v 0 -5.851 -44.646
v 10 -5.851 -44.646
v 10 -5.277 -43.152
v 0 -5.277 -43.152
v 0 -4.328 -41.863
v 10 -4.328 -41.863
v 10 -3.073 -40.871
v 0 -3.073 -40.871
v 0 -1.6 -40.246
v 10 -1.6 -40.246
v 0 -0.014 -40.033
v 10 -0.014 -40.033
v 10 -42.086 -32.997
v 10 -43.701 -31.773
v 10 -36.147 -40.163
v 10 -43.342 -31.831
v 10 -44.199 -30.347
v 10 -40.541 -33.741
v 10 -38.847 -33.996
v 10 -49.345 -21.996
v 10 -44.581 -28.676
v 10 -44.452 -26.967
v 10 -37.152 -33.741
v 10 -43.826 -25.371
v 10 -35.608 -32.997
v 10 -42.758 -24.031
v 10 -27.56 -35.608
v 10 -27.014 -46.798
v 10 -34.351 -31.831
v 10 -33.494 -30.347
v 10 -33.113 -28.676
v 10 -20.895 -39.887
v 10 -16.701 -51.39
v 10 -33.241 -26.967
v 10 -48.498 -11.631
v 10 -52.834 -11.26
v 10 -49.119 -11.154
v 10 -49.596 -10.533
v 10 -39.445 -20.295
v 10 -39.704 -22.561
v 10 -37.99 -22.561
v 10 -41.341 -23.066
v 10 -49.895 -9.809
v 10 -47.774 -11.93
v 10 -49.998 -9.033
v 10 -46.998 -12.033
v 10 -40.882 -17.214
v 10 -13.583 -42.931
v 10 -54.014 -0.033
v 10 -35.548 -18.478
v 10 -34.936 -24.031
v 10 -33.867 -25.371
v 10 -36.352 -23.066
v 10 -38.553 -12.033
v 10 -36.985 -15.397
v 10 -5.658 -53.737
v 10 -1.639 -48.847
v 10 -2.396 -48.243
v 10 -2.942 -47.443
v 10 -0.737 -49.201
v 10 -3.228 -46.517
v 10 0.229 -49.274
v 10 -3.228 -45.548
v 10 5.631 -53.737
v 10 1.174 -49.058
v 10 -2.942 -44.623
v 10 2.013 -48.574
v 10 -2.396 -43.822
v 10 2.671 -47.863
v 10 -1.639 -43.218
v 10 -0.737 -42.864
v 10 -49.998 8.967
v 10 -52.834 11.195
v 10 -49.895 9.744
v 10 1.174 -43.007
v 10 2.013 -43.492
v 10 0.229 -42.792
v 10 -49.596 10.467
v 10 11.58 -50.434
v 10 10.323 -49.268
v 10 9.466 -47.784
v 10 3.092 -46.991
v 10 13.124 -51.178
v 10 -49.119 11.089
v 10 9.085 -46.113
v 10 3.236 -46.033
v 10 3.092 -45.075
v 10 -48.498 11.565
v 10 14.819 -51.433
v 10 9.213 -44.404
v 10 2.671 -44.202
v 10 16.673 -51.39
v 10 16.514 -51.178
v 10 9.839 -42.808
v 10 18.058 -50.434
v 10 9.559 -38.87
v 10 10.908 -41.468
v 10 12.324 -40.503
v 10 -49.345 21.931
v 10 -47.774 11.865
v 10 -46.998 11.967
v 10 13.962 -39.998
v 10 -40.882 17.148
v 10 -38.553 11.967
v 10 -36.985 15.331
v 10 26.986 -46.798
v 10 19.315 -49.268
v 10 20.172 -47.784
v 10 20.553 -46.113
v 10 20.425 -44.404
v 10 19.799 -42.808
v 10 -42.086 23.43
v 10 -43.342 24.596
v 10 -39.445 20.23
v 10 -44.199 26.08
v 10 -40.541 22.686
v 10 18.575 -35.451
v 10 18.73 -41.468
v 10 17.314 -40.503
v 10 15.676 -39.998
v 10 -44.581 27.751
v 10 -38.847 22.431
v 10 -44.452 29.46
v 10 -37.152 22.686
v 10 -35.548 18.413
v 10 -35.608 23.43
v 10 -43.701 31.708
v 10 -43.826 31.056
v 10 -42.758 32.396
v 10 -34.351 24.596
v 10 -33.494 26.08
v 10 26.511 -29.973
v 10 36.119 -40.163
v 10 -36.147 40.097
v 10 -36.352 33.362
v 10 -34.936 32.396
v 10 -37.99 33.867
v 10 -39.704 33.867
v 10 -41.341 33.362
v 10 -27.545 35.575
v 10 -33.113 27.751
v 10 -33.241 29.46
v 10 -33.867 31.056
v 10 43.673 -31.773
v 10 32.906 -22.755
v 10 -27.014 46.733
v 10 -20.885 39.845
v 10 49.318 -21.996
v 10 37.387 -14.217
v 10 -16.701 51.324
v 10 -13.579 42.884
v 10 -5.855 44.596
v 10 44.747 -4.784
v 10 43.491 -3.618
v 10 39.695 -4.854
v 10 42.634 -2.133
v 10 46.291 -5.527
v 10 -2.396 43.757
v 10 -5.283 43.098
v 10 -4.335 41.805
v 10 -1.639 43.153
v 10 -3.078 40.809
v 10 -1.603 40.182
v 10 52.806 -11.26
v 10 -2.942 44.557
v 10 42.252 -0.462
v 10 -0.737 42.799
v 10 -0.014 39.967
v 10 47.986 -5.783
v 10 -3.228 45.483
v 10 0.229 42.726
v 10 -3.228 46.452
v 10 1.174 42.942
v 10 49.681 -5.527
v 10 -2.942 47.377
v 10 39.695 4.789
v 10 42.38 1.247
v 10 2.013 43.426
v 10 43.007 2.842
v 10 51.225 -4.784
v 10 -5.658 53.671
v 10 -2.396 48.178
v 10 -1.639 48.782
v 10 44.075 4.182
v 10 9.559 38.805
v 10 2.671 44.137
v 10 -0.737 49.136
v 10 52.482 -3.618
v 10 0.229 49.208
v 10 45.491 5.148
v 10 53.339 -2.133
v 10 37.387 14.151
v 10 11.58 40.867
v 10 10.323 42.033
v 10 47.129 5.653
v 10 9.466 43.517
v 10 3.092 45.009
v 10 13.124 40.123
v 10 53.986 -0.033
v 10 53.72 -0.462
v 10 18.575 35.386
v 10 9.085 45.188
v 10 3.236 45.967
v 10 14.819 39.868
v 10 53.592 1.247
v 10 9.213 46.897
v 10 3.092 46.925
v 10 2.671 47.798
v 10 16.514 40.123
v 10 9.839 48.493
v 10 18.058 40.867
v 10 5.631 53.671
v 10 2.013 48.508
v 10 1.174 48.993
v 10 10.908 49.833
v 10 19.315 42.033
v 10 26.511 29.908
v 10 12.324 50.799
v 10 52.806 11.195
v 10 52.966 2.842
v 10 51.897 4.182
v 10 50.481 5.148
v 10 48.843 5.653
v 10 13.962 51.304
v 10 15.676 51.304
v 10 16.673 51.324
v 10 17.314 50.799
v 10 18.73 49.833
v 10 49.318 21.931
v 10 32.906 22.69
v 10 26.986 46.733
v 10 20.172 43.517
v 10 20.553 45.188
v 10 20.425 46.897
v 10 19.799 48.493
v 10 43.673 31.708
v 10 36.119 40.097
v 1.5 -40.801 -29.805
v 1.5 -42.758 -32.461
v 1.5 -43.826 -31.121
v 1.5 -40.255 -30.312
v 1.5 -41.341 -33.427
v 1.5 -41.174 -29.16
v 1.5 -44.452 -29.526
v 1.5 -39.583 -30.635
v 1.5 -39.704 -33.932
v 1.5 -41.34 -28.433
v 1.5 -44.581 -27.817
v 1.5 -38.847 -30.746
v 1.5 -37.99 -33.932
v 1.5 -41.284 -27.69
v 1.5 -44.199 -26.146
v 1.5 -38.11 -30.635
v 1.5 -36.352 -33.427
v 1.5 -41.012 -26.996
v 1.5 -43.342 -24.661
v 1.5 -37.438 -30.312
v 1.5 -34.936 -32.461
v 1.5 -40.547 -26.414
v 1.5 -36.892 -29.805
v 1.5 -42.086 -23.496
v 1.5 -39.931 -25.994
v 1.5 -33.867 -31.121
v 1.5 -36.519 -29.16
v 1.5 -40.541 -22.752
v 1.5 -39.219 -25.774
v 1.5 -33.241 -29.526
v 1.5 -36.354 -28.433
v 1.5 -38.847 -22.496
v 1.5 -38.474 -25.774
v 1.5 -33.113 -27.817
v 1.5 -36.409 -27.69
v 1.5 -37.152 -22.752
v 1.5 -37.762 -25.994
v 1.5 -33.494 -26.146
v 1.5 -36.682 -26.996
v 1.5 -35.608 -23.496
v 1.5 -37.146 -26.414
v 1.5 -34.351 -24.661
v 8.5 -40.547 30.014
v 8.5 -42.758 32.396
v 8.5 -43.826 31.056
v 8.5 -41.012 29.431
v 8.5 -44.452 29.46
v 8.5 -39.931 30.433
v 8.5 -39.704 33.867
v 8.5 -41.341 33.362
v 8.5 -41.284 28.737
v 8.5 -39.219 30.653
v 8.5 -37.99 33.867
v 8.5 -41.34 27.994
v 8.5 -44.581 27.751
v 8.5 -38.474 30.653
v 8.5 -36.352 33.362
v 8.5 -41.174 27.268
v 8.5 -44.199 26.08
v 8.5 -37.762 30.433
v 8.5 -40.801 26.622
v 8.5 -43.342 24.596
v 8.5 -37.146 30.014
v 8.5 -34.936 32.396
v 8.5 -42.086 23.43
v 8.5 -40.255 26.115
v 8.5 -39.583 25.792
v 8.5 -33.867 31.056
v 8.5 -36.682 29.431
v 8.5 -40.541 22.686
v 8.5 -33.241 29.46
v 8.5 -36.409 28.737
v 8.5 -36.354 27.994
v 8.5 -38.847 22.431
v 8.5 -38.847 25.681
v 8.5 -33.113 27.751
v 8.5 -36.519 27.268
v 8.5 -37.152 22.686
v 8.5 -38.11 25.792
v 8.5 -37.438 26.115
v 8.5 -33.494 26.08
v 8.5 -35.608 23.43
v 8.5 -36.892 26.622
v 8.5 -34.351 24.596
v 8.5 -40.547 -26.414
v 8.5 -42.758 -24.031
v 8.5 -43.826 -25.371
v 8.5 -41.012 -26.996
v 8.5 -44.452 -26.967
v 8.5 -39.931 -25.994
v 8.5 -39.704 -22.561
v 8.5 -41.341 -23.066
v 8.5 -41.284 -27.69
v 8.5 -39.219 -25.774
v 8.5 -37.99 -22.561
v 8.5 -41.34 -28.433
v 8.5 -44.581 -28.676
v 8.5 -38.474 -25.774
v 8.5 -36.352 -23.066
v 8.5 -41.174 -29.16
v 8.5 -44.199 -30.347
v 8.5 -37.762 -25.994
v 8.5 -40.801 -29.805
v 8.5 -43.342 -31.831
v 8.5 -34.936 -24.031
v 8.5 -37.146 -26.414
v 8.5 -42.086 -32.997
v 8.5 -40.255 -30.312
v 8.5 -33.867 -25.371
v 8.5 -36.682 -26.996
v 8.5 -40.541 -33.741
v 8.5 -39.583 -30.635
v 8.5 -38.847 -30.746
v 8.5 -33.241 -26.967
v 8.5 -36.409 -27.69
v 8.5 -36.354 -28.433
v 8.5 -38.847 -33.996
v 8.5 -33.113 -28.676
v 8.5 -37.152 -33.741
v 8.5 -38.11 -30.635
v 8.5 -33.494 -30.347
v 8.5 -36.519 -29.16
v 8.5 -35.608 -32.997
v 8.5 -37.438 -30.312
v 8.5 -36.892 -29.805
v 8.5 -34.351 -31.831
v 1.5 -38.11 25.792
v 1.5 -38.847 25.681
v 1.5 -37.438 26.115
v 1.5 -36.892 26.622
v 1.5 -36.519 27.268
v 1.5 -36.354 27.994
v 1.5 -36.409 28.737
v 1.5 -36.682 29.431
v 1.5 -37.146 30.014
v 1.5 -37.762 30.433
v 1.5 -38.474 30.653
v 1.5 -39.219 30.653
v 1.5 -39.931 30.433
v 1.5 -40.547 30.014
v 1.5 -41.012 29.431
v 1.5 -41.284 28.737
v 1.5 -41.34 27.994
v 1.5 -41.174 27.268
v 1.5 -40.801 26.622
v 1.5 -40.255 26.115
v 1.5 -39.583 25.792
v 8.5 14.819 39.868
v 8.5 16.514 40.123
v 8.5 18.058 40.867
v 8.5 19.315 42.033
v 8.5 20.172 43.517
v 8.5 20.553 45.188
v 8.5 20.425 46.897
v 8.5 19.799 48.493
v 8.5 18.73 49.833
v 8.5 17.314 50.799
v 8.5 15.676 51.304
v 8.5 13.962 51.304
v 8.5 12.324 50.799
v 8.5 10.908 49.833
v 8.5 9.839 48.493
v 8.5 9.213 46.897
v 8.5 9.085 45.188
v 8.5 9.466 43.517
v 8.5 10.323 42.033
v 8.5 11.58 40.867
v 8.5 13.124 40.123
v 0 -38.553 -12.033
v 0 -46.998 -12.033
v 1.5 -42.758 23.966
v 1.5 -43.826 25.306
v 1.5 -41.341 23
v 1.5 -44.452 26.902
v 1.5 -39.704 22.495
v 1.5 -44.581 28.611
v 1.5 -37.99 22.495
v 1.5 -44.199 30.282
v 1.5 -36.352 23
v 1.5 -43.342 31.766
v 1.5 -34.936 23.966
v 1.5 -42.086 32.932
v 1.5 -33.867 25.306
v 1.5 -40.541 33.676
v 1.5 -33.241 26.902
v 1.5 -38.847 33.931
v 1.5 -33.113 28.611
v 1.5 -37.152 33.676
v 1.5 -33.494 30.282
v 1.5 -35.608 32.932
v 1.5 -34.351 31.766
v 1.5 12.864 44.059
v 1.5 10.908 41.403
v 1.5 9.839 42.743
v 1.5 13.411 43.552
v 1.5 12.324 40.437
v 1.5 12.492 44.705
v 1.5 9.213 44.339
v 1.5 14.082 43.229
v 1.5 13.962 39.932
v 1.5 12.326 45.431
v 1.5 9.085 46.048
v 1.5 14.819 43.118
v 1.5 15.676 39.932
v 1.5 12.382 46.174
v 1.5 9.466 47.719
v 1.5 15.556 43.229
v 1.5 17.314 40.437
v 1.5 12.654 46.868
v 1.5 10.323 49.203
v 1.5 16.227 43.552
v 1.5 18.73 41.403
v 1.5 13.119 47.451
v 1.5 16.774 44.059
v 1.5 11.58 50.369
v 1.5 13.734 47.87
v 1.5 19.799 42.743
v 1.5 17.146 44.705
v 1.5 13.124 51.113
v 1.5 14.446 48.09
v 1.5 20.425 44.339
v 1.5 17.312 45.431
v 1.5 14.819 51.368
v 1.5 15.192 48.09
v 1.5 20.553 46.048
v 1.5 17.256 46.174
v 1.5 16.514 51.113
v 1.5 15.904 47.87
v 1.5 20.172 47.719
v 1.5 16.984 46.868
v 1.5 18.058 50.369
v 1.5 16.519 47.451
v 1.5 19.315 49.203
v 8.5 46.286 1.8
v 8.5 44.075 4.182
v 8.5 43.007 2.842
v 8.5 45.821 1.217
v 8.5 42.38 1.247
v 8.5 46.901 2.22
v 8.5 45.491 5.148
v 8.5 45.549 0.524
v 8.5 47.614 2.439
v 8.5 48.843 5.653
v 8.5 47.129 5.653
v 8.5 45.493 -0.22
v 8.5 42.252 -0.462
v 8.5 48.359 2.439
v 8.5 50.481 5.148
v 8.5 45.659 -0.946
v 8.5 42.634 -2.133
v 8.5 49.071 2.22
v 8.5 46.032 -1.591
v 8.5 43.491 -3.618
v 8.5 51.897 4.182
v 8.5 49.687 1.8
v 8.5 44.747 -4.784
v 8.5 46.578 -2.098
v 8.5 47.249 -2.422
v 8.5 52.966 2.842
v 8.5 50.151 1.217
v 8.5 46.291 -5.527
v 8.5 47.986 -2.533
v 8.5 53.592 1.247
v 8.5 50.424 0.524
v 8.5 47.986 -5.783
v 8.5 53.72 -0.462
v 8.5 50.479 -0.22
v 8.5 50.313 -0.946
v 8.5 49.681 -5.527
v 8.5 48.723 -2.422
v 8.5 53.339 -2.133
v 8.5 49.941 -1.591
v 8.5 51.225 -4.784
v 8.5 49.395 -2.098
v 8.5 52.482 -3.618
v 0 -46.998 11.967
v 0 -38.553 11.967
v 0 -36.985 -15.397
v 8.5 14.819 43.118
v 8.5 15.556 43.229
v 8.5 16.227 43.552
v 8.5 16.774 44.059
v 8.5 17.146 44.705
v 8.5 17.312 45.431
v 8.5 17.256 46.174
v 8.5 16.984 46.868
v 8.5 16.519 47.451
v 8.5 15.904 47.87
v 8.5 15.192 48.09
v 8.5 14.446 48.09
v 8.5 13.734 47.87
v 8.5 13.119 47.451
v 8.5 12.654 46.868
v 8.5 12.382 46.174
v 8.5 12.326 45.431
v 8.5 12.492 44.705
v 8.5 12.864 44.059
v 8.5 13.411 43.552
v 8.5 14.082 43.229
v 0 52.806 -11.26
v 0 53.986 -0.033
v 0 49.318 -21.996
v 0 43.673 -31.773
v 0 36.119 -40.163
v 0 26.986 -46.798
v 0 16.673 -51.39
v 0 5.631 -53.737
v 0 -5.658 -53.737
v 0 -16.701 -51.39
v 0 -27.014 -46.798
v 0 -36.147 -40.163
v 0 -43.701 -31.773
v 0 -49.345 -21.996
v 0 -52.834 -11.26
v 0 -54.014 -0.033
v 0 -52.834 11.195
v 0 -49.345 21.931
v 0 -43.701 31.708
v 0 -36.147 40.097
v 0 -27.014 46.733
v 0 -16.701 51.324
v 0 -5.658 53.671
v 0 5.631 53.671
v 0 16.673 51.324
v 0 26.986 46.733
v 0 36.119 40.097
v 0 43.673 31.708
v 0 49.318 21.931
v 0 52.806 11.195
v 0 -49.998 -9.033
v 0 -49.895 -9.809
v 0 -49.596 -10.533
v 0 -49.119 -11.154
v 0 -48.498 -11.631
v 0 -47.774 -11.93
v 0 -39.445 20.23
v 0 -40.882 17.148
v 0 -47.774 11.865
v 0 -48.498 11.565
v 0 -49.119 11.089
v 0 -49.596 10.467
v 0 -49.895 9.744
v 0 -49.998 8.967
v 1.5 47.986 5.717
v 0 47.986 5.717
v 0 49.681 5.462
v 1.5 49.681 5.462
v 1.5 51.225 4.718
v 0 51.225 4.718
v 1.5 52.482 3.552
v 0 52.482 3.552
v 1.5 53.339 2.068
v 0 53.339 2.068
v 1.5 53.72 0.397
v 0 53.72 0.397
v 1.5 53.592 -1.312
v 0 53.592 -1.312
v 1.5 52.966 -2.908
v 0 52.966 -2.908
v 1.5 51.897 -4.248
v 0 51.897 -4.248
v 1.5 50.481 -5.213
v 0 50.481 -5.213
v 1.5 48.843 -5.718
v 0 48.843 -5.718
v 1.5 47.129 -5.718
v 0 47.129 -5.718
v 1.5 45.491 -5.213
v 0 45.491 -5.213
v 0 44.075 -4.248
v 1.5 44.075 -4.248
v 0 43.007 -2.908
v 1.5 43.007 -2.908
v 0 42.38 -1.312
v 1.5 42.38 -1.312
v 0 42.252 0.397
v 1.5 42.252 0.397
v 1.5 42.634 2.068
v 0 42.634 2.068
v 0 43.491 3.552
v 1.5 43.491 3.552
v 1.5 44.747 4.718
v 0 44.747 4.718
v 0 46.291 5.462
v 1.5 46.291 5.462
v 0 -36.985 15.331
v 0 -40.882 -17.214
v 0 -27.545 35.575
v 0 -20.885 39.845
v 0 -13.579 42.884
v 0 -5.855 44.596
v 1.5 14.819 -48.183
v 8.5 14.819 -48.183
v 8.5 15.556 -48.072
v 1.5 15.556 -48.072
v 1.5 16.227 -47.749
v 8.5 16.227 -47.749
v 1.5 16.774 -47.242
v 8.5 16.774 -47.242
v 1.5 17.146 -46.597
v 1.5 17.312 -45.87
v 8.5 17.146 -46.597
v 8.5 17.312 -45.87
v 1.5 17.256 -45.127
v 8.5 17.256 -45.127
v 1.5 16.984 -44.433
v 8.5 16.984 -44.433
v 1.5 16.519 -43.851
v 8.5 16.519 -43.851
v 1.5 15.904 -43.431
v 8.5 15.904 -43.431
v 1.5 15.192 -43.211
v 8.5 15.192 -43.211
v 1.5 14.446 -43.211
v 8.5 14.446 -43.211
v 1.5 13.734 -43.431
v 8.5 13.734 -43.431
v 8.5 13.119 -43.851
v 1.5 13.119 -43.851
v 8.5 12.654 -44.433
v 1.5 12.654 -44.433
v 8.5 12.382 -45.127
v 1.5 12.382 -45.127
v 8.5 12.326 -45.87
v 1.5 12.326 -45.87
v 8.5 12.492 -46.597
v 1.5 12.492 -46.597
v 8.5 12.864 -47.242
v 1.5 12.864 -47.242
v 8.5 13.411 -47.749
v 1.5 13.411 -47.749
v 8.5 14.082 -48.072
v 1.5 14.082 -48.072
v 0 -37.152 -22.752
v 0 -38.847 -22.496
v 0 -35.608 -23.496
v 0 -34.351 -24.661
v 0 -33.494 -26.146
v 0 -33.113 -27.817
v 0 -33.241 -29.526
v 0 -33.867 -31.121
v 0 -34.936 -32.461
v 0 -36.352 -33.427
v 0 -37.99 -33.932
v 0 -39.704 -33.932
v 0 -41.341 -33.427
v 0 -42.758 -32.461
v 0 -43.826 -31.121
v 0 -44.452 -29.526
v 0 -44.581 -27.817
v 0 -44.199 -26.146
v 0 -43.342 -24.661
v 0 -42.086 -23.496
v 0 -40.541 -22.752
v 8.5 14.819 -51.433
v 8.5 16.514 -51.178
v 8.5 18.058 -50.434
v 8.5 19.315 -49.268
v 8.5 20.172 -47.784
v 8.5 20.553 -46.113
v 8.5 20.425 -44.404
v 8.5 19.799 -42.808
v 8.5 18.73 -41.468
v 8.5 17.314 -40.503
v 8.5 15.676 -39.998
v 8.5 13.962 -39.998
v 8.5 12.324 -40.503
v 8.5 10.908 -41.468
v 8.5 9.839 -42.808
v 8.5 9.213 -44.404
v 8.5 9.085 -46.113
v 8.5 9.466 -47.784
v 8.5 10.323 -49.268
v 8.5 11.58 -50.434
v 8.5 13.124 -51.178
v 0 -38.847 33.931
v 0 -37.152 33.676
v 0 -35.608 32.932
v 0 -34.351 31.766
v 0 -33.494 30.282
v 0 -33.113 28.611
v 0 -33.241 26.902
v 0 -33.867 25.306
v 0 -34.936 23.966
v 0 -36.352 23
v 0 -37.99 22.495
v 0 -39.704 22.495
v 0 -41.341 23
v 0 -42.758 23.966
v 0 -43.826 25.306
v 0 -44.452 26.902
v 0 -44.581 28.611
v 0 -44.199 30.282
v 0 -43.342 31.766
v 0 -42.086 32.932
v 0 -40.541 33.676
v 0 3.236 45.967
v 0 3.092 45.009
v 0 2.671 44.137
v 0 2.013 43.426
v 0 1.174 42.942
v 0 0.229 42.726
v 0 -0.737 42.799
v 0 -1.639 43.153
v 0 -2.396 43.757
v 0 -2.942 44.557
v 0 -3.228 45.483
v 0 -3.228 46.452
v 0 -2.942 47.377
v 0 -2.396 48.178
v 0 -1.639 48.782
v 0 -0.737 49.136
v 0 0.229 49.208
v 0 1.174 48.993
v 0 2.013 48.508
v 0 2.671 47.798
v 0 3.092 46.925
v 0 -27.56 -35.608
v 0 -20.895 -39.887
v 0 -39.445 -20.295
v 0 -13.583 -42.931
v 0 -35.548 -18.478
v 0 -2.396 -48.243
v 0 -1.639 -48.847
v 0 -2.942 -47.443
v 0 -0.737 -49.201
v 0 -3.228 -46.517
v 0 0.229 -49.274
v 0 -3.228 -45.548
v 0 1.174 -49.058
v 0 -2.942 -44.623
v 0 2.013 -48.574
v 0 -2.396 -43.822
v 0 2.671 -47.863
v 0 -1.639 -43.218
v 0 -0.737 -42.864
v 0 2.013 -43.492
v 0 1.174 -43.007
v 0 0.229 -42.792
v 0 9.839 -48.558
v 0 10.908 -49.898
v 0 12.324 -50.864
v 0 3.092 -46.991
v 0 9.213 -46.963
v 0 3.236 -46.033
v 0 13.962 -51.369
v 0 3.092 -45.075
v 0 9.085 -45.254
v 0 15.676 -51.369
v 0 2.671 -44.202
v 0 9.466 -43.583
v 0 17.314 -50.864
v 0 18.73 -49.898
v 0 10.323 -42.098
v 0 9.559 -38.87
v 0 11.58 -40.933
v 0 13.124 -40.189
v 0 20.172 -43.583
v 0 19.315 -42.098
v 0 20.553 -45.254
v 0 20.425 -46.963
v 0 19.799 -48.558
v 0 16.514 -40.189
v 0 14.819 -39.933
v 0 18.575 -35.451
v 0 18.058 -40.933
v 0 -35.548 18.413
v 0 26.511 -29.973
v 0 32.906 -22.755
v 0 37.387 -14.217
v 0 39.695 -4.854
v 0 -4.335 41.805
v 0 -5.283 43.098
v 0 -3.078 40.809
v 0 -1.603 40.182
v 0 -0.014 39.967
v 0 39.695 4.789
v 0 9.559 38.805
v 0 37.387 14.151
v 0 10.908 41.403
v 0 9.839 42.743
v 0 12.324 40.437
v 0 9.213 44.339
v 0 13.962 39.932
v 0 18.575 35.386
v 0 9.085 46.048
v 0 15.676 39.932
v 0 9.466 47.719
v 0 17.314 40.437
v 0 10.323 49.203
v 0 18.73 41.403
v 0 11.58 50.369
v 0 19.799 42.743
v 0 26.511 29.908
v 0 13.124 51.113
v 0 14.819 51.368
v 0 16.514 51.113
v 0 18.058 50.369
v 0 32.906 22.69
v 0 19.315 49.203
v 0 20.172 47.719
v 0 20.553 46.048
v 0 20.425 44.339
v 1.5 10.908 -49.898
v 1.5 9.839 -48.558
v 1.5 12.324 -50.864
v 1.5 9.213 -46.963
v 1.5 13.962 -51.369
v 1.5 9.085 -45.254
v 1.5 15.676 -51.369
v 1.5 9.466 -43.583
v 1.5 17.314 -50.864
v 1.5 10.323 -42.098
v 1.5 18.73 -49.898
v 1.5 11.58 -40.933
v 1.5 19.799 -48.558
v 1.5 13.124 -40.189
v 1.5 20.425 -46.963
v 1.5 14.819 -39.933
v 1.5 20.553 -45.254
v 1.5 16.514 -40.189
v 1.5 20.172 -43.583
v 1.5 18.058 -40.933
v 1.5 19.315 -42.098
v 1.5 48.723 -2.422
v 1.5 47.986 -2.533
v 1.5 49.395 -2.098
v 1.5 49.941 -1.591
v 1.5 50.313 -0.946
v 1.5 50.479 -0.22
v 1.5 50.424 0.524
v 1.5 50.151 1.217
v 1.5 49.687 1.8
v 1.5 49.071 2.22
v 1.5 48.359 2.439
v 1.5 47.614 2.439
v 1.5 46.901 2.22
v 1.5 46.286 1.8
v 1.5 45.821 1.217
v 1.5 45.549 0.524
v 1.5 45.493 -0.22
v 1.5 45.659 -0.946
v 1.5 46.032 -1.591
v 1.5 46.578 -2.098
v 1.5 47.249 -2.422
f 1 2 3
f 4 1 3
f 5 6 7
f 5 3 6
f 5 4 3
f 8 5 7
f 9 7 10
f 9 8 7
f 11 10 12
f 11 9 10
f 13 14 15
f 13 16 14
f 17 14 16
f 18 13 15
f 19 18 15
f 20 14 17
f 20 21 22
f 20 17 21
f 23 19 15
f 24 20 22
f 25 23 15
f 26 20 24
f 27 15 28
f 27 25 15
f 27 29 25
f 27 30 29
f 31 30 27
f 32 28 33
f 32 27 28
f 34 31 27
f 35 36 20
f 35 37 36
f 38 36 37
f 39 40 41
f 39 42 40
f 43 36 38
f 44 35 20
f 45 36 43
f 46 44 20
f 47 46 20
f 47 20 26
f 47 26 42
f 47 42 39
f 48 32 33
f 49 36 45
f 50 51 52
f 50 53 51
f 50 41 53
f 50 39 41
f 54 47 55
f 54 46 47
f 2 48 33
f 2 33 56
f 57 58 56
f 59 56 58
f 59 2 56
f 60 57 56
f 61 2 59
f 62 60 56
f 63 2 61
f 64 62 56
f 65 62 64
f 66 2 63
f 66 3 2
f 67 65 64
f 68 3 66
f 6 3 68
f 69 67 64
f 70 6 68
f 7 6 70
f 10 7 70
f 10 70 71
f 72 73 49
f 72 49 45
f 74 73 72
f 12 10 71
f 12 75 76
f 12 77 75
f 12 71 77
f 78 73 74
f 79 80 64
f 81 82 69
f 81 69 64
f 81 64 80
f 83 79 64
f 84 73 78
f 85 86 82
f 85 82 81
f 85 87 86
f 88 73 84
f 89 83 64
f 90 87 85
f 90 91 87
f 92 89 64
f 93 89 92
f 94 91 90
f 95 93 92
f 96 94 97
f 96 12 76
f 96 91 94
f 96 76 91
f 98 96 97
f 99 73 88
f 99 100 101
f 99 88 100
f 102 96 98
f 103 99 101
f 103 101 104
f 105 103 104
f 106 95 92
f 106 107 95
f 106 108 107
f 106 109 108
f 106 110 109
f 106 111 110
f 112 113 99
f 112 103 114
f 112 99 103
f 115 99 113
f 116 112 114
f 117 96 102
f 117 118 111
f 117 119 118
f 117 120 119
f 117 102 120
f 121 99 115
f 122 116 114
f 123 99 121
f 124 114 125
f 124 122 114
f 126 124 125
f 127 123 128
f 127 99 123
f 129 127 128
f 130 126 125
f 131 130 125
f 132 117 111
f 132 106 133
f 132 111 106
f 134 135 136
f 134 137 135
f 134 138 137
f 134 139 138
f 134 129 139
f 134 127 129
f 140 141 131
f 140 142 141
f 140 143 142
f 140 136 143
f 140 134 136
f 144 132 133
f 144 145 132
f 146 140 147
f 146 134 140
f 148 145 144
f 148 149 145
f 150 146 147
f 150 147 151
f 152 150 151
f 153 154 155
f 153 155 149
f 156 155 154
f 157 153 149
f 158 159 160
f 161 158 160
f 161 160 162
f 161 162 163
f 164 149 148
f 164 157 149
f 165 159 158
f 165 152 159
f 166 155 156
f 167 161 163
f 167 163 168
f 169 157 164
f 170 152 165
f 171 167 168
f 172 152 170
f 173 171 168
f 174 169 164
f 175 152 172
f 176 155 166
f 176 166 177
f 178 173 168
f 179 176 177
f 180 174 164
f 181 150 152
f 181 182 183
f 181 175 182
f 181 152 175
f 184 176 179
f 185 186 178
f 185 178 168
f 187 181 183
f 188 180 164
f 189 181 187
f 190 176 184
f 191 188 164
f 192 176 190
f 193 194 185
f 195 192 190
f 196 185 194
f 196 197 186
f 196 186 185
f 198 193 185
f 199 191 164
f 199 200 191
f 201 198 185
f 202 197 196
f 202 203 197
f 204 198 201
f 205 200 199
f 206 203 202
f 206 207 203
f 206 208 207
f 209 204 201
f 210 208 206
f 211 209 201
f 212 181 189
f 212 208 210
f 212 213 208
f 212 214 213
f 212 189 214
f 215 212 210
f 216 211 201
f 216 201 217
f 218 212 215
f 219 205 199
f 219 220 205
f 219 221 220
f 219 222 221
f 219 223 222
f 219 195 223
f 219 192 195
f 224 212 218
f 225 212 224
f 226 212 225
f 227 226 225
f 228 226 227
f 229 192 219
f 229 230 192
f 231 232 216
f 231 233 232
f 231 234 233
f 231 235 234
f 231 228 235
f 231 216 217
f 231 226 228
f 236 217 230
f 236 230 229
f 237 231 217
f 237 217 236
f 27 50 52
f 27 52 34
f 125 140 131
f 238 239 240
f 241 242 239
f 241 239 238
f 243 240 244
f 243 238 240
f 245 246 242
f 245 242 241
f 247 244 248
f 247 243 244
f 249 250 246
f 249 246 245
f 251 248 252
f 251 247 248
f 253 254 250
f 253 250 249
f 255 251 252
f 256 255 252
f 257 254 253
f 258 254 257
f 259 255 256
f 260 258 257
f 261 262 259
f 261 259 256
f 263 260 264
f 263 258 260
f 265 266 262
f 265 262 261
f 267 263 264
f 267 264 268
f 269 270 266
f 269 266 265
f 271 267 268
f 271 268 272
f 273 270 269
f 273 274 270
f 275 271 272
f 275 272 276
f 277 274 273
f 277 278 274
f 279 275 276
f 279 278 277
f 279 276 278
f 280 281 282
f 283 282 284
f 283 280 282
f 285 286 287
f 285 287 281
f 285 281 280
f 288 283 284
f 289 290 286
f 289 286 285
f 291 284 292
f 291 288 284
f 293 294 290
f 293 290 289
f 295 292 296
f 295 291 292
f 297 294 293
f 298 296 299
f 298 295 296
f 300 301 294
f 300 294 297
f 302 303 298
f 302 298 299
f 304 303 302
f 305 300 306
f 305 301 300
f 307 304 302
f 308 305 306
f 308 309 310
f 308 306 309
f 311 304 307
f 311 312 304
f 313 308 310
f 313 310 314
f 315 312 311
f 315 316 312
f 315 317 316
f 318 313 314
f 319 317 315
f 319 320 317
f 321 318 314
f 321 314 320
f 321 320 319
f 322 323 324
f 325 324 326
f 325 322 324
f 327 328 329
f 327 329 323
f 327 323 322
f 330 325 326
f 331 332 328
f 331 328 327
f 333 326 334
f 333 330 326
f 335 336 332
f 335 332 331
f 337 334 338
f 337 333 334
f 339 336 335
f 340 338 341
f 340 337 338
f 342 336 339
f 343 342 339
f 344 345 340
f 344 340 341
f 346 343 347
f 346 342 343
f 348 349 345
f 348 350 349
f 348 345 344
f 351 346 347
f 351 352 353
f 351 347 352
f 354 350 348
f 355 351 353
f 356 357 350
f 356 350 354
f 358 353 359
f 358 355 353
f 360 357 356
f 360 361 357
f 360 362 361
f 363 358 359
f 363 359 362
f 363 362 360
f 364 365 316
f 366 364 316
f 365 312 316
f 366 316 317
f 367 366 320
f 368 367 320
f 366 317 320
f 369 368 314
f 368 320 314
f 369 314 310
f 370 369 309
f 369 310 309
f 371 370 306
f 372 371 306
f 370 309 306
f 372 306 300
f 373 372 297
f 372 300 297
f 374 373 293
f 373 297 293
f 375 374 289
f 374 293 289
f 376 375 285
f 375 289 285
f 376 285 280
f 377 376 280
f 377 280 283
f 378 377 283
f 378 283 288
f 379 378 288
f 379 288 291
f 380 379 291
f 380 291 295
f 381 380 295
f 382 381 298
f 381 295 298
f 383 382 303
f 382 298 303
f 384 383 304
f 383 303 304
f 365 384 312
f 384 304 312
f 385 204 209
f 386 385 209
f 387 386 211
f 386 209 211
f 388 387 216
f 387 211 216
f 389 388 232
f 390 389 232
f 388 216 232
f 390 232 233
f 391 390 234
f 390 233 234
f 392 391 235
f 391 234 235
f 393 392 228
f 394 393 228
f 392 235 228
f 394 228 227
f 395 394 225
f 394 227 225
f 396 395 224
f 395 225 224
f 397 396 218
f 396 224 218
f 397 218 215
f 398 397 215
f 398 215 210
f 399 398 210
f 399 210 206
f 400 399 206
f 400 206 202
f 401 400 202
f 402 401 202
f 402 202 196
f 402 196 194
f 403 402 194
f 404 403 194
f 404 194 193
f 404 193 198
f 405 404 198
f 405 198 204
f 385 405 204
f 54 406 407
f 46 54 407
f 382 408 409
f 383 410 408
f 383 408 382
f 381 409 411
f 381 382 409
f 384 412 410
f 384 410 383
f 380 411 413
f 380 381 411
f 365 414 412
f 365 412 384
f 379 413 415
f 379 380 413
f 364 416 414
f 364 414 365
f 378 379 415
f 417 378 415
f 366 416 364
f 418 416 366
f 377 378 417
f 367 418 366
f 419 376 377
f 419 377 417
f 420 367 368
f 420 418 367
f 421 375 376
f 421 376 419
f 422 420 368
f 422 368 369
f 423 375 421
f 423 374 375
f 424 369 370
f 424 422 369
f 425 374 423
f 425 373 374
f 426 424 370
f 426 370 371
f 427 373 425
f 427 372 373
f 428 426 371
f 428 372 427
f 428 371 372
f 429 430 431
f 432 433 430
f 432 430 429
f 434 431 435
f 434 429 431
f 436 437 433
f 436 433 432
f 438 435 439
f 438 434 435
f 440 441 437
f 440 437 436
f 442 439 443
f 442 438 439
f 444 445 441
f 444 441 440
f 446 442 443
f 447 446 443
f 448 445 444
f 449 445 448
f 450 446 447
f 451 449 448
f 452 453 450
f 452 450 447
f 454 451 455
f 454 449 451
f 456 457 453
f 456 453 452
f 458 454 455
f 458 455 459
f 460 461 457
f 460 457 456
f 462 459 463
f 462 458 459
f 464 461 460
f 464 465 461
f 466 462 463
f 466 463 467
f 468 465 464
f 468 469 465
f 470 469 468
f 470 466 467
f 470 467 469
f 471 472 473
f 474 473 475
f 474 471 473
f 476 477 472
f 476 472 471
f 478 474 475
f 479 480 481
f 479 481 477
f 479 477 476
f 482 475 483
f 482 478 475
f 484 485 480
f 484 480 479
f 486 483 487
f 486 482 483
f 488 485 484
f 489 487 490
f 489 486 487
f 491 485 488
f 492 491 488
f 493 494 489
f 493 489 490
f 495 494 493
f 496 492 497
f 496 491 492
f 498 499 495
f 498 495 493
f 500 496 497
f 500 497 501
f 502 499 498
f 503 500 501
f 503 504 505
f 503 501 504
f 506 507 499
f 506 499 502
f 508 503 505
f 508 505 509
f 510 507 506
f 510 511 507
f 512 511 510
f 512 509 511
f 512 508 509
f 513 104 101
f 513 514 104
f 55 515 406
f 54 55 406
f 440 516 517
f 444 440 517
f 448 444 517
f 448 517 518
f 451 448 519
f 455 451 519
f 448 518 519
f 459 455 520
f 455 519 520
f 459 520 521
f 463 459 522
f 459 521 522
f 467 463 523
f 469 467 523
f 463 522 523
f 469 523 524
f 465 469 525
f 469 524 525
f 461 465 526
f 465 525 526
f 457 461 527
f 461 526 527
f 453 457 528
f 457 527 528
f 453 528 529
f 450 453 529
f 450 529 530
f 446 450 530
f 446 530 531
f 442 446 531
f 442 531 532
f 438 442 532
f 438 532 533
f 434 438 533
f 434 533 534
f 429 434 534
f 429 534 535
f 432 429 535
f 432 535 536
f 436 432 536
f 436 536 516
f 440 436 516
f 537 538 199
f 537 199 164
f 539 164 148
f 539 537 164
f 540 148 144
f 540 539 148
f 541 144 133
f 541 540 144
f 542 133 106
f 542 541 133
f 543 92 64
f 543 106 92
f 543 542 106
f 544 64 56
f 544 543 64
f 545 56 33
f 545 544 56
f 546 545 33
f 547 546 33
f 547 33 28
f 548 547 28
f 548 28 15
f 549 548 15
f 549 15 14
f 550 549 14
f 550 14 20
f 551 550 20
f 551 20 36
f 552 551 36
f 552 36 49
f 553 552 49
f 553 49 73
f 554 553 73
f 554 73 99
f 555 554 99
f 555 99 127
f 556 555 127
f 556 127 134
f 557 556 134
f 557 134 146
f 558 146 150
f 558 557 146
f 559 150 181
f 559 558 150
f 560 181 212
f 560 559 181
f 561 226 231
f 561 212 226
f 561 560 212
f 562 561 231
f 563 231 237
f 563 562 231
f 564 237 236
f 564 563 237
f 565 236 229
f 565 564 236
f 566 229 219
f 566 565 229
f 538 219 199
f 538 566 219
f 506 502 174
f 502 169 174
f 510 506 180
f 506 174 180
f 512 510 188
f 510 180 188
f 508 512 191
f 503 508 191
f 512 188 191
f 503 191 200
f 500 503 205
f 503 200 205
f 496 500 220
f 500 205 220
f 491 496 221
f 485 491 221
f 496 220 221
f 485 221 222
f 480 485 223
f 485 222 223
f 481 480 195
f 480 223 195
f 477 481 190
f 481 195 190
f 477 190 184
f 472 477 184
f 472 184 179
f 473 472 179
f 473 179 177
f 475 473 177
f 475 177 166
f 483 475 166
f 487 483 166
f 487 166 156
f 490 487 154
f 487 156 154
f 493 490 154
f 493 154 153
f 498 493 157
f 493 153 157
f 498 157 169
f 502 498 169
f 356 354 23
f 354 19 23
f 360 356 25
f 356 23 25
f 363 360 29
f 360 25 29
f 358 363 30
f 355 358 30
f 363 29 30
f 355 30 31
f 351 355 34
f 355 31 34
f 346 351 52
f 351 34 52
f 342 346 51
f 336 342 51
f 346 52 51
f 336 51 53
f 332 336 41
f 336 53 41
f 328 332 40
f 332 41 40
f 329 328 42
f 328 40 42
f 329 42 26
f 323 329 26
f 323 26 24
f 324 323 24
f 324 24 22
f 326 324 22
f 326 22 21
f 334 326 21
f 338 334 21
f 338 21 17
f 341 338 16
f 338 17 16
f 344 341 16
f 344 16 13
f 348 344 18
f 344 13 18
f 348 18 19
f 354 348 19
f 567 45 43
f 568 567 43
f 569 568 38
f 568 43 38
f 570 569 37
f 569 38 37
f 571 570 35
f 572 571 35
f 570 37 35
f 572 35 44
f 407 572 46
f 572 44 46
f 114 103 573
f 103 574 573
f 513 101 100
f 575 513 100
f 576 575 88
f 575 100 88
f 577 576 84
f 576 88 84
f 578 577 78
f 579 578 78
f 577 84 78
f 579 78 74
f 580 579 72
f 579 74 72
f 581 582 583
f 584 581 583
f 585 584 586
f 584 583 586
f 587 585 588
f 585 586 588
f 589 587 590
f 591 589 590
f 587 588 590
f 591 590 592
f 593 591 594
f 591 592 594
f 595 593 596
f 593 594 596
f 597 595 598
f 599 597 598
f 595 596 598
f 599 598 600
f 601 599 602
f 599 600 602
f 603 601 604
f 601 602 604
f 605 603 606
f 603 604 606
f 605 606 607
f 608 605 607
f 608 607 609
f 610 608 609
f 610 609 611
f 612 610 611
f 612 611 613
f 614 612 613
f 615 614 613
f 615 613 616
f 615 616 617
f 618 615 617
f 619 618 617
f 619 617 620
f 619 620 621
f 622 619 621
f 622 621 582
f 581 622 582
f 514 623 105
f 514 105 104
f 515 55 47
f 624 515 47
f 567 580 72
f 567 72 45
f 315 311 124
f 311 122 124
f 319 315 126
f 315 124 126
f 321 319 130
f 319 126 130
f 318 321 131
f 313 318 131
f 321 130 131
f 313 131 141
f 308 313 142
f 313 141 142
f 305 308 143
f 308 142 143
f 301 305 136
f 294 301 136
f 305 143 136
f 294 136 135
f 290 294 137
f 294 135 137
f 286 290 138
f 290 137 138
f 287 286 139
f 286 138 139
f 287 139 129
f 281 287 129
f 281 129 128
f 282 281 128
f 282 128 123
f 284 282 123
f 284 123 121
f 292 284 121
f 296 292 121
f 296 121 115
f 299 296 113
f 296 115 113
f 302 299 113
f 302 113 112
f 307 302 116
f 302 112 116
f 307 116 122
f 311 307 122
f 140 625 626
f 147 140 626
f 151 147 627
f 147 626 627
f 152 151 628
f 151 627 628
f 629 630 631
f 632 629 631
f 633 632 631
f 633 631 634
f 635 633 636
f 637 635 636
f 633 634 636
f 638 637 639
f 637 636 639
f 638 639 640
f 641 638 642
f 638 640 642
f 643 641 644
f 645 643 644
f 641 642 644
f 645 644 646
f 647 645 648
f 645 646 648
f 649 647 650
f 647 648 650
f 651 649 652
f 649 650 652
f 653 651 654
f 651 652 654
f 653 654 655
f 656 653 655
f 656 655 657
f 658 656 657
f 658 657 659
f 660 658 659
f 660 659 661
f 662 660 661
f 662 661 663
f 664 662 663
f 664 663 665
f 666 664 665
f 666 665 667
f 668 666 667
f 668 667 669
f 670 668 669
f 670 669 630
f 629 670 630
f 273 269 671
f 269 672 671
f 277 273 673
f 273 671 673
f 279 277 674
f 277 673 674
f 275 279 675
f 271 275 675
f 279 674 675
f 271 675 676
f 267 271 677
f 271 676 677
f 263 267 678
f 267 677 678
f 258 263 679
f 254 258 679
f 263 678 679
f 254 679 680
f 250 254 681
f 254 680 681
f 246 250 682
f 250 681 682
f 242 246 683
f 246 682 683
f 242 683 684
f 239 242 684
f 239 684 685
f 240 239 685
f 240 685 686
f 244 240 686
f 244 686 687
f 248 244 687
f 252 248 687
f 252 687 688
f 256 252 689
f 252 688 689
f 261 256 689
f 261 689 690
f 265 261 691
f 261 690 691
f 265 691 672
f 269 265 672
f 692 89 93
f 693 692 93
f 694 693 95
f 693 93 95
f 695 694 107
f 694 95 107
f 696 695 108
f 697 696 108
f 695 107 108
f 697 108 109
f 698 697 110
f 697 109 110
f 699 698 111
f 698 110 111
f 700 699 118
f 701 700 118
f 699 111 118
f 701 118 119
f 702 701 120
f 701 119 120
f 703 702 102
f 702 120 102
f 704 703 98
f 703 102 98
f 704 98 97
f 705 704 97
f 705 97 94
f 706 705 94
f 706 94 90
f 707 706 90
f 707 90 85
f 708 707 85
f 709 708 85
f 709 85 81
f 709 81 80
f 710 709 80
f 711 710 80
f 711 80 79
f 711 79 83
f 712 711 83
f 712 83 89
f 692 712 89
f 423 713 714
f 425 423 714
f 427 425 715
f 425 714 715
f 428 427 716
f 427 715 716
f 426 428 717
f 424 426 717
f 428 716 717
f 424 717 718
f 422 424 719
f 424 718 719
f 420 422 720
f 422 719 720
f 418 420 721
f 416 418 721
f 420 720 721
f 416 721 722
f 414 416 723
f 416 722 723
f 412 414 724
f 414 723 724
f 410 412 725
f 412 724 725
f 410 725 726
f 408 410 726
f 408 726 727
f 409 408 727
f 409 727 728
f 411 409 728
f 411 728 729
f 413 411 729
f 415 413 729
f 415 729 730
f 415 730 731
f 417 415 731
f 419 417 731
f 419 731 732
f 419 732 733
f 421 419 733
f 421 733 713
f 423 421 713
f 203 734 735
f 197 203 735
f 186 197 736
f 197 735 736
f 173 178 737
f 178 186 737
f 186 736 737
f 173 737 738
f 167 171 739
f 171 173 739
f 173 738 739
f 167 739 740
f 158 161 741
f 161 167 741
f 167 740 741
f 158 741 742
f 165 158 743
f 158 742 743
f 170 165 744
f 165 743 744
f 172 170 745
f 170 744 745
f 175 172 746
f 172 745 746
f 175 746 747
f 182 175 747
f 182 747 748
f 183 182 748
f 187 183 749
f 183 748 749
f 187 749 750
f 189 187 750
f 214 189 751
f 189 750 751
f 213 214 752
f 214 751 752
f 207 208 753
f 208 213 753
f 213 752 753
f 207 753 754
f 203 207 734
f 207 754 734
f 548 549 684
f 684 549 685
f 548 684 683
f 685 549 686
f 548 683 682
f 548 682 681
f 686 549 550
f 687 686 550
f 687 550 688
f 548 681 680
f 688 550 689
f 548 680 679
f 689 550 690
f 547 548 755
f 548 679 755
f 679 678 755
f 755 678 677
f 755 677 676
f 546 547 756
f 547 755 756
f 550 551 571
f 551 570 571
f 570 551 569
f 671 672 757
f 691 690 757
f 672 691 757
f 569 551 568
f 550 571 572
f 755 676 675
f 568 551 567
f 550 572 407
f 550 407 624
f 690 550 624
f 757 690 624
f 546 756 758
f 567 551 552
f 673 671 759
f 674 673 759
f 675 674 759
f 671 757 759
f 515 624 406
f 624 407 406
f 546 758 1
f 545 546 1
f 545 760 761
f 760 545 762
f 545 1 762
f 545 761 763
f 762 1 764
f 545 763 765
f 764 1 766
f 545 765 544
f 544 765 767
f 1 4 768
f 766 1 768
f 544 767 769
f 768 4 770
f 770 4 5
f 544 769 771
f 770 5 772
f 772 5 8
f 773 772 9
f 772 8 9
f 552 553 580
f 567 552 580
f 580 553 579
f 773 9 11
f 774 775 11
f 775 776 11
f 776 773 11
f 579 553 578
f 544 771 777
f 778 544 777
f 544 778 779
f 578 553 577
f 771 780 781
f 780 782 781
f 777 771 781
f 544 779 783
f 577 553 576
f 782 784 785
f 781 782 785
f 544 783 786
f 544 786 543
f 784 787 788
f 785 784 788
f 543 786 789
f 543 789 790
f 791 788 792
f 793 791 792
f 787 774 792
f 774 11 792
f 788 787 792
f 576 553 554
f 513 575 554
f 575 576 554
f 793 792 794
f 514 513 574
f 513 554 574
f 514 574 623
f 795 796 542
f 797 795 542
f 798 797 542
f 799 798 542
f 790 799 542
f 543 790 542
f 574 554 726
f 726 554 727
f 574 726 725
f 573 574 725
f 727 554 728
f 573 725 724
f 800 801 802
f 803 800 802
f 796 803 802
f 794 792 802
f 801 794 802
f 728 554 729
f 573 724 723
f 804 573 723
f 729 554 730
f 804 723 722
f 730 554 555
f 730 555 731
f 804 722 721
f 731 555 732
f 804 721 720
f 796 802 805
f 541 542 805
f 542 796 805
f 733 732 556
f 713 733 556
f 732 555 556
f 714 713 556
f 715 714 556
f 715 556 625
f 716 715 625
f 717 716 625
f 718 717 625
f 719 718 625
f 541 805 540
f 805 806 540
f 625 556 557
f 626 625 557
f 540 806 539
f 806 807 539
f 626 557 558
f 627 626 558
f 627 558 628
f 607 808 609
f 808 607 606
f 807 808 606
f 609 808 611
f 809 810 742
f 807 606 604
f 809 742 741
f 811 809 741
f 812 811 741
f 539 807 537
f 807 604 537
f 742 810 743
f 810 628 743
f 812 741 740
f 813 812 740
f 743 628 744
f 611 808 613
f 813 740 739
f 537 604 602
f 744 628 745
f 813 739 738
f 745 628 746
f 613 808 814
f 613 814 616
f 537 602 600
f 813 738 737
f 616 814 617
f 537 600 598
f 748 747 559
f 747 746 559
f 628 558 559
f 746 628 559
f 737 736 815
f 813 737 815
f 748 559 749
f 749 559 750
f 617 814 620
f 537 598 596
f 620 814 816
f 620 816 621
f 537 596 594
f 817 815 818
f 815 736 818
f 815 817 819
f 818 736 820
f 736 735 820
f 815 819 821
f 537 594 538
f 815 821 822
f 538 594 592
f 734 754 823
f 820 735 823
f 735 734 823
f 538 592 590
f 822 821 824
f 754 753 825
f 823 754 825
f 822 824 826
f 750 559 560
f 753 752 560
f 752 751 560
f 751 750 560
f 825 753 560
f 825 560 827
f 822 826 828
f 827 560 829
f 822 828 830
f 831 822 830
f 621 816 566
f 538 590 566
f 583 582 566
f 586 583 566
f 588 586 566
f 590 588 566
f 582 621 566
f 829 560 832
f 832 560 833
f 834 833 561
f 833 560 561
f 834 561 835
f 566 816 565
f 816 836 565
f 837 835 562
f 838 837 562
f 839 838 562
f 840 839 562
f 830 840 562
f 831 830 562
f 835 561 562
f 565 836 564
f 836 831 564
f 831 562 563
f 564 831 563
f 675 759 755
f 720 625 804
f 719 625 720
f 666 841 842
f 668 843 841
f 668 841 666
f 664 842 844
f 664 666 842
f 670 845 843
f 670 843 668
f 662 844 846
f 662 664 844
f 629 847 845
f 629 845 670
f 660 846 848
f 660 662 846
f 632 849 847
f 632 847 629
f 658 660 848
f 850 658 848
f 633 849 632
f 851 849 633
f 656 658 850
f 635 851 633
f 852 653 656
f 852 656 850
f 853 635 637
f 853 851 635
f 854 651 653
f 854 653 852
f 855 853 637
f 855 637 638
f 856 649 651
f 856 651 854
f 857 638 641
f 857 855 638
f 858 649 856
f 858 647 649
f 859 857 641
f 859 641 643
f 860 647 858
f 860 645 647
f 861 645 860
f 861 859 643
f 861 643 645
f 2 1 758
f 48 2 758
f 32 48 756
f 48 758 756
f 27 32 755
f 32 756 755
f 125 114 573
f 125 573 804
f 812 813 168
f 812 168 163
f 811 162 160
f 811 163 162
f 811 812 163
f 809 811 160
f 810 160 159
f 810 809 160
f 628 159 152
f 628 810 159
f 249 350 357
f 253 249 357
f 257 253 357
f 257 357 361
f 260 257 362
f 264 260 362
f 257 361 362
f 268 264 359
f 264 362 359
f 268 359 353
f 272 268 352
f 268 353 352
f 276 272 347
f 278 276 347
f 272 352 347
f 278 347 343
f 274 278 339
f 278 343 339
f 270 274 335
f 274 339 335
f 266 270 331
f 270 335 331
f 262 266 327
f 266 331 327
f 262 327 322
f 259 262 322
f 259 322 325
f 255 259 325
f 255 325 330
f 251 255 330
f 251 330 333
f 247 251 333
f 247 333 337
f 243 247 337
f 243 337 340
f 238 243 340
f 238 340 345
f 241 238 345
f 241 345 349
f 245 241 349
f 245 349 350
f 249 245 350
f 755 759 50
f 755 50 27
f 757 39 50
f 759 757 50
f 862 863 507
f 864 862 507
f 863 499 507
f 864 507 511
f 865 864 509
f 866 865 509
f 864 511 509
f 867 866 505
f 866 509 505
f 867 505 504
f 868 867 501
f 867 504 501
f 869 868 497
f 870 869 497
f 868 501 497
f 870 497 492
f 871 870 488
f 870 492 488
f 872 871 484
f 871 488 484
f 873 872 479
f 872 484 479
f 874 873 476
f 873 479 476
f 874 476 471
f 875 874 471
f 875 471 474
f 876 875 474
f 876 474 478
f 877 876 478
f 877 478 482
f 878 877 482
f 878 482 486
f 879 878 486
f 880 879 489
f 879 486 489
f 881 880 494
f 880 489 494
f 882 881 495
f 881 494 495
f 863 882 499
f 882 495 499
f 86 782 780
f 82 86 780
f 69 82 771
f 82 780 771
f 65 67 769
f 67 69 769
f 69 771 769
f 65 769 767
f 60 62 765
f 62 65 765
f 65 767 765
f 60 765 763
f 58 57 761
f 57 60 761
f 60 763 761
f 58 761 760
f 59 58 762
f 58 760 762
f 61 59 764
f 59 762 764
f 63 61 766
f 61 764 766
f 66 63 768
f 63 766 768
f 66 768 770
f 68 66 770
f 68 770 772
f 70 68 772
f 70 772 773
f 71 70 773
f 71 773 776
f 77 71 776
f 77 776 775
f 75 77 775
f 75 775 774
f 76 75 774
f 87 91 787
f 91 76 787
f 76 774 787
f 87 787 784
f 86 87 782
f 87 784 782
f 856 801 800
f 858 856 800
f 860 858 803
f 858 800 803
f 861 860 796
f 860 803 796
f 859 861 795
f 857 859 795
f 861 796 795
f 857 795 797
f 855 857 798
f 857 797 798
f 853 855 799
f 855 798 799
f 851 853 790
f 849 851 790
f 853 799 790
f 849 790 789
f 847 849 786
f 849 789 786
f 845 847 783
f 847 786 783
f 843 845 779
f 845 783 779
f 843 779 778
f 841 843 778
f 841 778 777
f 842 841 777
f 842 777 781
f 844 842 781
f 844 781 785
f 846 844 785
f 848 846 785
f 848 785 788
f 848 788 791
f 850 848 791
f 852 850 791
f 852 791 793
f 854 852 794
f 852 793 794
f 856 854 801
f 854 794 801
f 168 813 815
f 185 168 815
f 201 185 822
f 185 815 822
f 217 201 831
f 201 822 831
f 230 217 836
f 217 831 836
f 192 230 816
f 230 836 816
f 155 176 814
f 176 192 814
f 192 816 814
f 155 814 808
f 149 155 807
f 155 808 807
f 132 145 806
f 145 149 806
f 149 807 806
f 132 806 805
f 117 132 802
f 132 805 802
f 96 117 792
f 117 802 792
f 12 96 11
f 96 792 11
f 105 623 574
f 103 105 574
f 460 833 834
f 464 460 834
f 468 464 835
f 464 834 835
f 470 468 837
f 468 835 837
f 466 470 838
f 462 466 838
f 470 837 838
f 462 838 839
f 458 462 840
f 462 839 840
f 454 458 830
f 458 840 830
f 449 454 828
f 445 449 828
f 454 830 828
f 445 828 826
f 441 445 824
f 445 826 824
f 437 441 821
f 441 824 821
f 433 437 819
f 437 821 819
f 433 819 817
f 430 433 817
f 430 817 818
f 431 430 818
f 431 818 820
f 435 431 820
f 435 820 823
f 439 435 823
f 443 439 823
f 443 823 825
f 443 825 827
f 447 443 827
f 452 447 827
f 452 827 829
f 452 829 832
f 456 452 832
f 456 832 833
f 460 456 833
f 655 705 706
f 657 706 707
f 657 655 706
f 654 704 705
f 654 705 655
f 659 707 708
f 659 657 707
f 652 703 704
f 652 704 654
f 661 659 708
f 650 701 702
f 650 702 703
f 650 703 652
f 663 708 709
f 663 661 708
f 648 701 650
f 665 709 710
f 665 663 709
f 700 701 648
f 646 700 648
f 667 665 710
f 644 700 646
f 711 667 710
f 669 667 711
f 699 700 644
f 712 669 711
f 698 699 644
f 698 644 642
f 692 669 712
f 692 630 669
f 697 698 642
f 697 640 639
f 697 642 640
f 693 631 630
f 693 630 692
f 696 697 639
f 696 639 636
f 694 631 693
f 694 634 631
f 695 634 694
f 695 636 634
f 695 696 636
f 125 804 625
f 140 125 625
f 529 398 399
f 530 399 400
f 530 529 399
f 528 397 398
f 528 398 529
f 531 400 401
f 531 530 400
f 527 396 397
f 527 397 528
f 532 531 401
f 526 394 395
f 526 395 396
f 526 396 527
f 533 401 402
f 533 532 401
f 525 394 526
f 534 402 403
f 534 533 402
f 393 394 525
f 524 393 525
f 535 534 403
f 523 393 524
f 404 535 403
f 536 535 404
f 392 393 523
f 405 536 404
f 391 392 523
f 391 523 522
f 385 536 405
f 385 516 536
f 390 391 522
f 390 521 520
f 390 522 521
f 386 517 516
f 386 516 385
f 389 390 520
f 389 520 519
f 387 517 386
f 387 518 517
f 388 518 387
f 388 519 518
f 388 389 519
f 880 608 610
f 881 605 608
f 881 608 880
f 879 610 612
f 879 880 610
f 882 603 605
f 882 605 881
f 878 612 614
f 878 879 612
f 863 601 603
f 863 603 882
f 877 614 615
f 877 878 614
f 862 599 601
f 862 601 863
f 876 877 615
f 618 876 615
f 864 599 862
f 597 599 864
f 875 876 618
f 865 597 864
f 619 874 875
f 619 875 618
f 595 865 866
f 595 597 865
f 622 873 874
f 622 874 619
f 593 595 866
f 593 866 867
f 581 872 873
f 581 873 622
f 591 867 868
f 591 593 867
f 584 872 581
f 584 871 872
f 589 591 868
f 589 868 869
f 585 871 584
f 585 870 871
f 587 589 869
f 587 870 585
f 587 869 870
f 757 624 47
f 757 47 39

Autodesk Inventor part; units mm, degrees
ref_plane "YZ Plane" through (0, 0, 0) normal (1, 0, 0) x (0, 1, 0)
ref_plane "XZ Plane" through (0, 0, 0) normal (0, 1, 0) x (-1, 0, 0)
ref_plane "XY Plane" through (0, 0, 0) normal (0, 0, 1) x (1, 0, 0)
sketch "Sketch1" plane through (0, 0, 0) normal (1, 0, 0) x (0, 1, 0)
  circle A0 centre (-0.0138, -0.0327) radius 54
  circle A1 centre (-0.0138, 45.9673) radius 3.25
  circle A2 centre (-0.0138, -46.0327) radius 3.25
  arc A3 (-5.855, 44.5961) -> (-0.0138, 39.9673) centre (-0.0138, 45.9673) ccw
  arc A4 (-0.0138, -40.0327) -> (-5.8512, -44.6455) centre (-0.0138, -46.0327) ccw
  arc A5 (-0.0138, -40.0327) -> (-0.0138, 39.9673) centre (-0.0138, -0.0327) ccw
  line L0 (-38.5532, 11.9673) -> (-49.9975, 11.9673)
  line L1 (-49.9975, 11.9673) -> (-49.9975, -12.0327)
  line L2 (-38.5532, -12.0327) -> (-49.9975, -12.0327)
  arc A6 (-5.855, 44.5961) -> (-27.5449, 35.5747) centre (-0.0138, -0.0327) ccw
  arc A7 (-27.56, -35.6078) -> (-5.8512, -44.6455) centre (-0.0138, -0.0327) ccw
  line L3 (-36.9846, 15.3313) -> (-40.8817, 17.1485)
  line L4 (-40.8817, 17.1485) -> (-39.4448, 20.23)
  line L5 (-39.4448, 20.23) -> (-35.5477, 18.4127)
  line L6 (-35.5477, 18.4127) -> (-27.5449, 35.5747)
  line L7 (-36.9846, 15.3313) -> (-38.5532, 11.9673)
  line L8 (-36.9846, -15.3967) -> (-40.8817, -17.214)
  line L9 (-40.8817, -17.214) -> (-39.4448, -20.2954)
  line L10 (-39.4448, -20.2954) -> (-35.5477, -18.4782)
  line L11 (-36.9846, -15.3967) -> (-38.5532, -12.0327)
  line L12 (-35.5477, -18.4782) -> (-27.56, -35.6078)
  line L13 (-0.0138, -0.0327) -> (-40.1632, 18.6893)
  line L14 (-0.0138, -0.0327) -> (-40.1632, -18.7547)
  line L15 (-0.0138, -0.0327) -> (-50.798, -0.0327) construction
  line L16 (-0.0138, -0.0327) -> (50.7703, -0.0327) construction
  dimension "d4" = 6.5
  dimension "d5" = 6.5
  dimension "d25" = 24
  dimension "d27" = 4.3
  dimension "d28" = 3.4
  dimension "d31" = 4.3
  dimension "d32" = 3.4
  dimension "d39" = 90
  dimension "d40" = 90
  dimension "d41" = 90
  dimension "d42" = 90
  dimension "d44" = 90
  dimension "d45" = 90
  dimension "d67" = 40
  dimension "d68" = 40
  dimension "d70" = 4.3
  dimension "d71" = 1.7
  dimension "d72" = 4.3
  dimension "d73" = 90
  dimension "d74" = 90
  dimension "d76" = 108
  dimension "d81" = 40
  dimension "d93" = 46
  dimension "d94" = 46
  dimension "d95" = 6
  dimension "d96" = 6
  dimension "d97" = 180
  dimension "d98" = 12
  dimension "d99" = 12
  dimension "d100" = 25
  dimension "d101" = 25
  dimension "d102" = 1.7
extrude "Extrusion1" add sketch "Sketch1" along normal blind 10
fillet "Fillet1" radius 3 2 edges at (5, -49.9975, 11.9673) (5, -49.9975, -12.0327)
sketch "Sketch2" plane through (10, -0.0138, -0.0327) normal (1, 0, 0) x (0, 0, -1)
  circle A0 centre (0, 0) radius 48
  circle A1 centre (0, 48) radius 2.5
  arc A2 (40, 0) -> (-40, 0) centre (0, 0) ccw projected
  arc A3 (40, 0) -> (44.6128, -5.8374) centre (46, 0) ccw projected
  arc A4 (35.575, -27.5462) -> (44.6128, -5.8374) centre (0, 0) ccw projected
  line L0 (35.575, -27.5462) -> (18.4455, -35.5339) projected
  line L1 (18.4455, -35.5339) -> (20.2627, -39.431) projected
  line L2 (20.2627, -39.431) -> (17.1813, -40.8679) projected
  line L3 (17.1813, -40.8679) -> (15.364, -36.9708) projected
  line L4 (15.364, -36.9708) -> (12, -38.5394) projected
  line L5 (12, -38.5394) -> (12, -46.9837) projected
  arc A5 (9, -49.9837) -> (12, -46.9837) centre (9, -46.9837) ccw projected
  line L6 (9, -49.9837) -> (-9, -49.9837) projected
  arc A6 (-12, -46.9837) -> (-9, -49.9837) centre (-9, -46.9837) ccw projected
  line L7 (-12, -46.9837) -> (-12, -38.5394) projected
  line L8 (-12, -38.5394) -> (-15.364, -36.9708) projected
  line L9 (-15.364, -36.9708) -> (-17.1813, -40.8679) projected
  line L10 (-17.1813, -40.8679) -> (-20.2627, -39.431) projected
  line L11 (-20.2627, -39.431) -> (-18.4455, -35.5339) projected
  line L12 (-18.4455, -35.5339) -> (-35.6074, -27.5311) projected
  arc A7 (-44.6288, -5.8412) -> (-35.6074, -27.5311) centre (0, 0) ccw projected
  arc A8 (-44.6288, -5.8412) -> (-40, 0) centre (-46, 0) ccw projected
  circle A9 centre (46, 0) radius 3.25 projected
  circle A10 centre (-46, 0) radius 3.25 projected
  circle A11 centre (0, 0) radius 54 projected
  circle A12 centre (0, 0) radius 54 projected
  circle A13 centre (-45.6507, 14.8328) radius 2.5
  circle A14 centre (-28.2137, -38.8328) radius 2.5
  circle A15 centre (28.2137, -38.8328) radius 2.5
  circle A16 centre (45.6507, 14.8328) radius 2.5
  point P0 (-0.0327, 0.0138)
  dimension "d50" = 96
  dimension "d51" = 5
  dimension "d80" = 108
  dimension "d84" = 360
  dimension "d103" = 0
extrude "Extrusion2" cut sketch "Sketch2" against normal blind 10 contours A16 A0 | A0 A16 | A15 A0 | A0 A15 | A1 A0 | A0 A1 | A13 A0 | A0 A13 | A14 A0 | A0 A14
sketch "Sketch3" plane through (10, -0.0138, -0.0327) normal (1, 0, 0) x (0, 0, -1)
  circle A0 centre (0, 48) radius 2.5 projected
  circle A1 centre (0, 48) radius 5.75
  circle A2 centre (0, 0) radius 54 projected
  circle A3 centre (-45.6507, 14.8328) radius 5.75
  circle A4 centre (-28.2137, -38.8328) radius 5.75
  circle A5 centre (28.2137, -38.8328) radius 5.75
  circle A6 centre (45.6507, 14.8328) radius 5.75
  point P0 (-0.0327, 0.0138)
  dimension "d58" = 11.5
  dimension "d88" = 360
extrude "Extrusion3" cut sketch "Sketch3" against normal blind 1.5 contours A1 | A3 | A4 | A5 | A6
sketch "Sketch6" plane through (0, -0.0138, -0.0327) normal (-1, 0, 0) x (0, 0, 1)
  circle A0 centre (0, 48) radius 5.75 projected
  circle A1 centre (-45.6507, 14.8328) radius 5.75 projected
  circle A2 centre (-28.2137, -38.8328) radius 5.75 projected
  circle A3 centre (28.2137, -38.8328) radius 5.75 projected
  circle A4 centre (45.6507, 14.8328) radius 5.75 projected
  point P0 (0.0327, 0.0138)
extrude "Extrusion5" cut sketch "Sketch6" against normal blind 1.5
equation "\"d98\" = 0.5 * d25"
properties part number "3219_Center Rung_V1" material "Acetal Resin, White"
